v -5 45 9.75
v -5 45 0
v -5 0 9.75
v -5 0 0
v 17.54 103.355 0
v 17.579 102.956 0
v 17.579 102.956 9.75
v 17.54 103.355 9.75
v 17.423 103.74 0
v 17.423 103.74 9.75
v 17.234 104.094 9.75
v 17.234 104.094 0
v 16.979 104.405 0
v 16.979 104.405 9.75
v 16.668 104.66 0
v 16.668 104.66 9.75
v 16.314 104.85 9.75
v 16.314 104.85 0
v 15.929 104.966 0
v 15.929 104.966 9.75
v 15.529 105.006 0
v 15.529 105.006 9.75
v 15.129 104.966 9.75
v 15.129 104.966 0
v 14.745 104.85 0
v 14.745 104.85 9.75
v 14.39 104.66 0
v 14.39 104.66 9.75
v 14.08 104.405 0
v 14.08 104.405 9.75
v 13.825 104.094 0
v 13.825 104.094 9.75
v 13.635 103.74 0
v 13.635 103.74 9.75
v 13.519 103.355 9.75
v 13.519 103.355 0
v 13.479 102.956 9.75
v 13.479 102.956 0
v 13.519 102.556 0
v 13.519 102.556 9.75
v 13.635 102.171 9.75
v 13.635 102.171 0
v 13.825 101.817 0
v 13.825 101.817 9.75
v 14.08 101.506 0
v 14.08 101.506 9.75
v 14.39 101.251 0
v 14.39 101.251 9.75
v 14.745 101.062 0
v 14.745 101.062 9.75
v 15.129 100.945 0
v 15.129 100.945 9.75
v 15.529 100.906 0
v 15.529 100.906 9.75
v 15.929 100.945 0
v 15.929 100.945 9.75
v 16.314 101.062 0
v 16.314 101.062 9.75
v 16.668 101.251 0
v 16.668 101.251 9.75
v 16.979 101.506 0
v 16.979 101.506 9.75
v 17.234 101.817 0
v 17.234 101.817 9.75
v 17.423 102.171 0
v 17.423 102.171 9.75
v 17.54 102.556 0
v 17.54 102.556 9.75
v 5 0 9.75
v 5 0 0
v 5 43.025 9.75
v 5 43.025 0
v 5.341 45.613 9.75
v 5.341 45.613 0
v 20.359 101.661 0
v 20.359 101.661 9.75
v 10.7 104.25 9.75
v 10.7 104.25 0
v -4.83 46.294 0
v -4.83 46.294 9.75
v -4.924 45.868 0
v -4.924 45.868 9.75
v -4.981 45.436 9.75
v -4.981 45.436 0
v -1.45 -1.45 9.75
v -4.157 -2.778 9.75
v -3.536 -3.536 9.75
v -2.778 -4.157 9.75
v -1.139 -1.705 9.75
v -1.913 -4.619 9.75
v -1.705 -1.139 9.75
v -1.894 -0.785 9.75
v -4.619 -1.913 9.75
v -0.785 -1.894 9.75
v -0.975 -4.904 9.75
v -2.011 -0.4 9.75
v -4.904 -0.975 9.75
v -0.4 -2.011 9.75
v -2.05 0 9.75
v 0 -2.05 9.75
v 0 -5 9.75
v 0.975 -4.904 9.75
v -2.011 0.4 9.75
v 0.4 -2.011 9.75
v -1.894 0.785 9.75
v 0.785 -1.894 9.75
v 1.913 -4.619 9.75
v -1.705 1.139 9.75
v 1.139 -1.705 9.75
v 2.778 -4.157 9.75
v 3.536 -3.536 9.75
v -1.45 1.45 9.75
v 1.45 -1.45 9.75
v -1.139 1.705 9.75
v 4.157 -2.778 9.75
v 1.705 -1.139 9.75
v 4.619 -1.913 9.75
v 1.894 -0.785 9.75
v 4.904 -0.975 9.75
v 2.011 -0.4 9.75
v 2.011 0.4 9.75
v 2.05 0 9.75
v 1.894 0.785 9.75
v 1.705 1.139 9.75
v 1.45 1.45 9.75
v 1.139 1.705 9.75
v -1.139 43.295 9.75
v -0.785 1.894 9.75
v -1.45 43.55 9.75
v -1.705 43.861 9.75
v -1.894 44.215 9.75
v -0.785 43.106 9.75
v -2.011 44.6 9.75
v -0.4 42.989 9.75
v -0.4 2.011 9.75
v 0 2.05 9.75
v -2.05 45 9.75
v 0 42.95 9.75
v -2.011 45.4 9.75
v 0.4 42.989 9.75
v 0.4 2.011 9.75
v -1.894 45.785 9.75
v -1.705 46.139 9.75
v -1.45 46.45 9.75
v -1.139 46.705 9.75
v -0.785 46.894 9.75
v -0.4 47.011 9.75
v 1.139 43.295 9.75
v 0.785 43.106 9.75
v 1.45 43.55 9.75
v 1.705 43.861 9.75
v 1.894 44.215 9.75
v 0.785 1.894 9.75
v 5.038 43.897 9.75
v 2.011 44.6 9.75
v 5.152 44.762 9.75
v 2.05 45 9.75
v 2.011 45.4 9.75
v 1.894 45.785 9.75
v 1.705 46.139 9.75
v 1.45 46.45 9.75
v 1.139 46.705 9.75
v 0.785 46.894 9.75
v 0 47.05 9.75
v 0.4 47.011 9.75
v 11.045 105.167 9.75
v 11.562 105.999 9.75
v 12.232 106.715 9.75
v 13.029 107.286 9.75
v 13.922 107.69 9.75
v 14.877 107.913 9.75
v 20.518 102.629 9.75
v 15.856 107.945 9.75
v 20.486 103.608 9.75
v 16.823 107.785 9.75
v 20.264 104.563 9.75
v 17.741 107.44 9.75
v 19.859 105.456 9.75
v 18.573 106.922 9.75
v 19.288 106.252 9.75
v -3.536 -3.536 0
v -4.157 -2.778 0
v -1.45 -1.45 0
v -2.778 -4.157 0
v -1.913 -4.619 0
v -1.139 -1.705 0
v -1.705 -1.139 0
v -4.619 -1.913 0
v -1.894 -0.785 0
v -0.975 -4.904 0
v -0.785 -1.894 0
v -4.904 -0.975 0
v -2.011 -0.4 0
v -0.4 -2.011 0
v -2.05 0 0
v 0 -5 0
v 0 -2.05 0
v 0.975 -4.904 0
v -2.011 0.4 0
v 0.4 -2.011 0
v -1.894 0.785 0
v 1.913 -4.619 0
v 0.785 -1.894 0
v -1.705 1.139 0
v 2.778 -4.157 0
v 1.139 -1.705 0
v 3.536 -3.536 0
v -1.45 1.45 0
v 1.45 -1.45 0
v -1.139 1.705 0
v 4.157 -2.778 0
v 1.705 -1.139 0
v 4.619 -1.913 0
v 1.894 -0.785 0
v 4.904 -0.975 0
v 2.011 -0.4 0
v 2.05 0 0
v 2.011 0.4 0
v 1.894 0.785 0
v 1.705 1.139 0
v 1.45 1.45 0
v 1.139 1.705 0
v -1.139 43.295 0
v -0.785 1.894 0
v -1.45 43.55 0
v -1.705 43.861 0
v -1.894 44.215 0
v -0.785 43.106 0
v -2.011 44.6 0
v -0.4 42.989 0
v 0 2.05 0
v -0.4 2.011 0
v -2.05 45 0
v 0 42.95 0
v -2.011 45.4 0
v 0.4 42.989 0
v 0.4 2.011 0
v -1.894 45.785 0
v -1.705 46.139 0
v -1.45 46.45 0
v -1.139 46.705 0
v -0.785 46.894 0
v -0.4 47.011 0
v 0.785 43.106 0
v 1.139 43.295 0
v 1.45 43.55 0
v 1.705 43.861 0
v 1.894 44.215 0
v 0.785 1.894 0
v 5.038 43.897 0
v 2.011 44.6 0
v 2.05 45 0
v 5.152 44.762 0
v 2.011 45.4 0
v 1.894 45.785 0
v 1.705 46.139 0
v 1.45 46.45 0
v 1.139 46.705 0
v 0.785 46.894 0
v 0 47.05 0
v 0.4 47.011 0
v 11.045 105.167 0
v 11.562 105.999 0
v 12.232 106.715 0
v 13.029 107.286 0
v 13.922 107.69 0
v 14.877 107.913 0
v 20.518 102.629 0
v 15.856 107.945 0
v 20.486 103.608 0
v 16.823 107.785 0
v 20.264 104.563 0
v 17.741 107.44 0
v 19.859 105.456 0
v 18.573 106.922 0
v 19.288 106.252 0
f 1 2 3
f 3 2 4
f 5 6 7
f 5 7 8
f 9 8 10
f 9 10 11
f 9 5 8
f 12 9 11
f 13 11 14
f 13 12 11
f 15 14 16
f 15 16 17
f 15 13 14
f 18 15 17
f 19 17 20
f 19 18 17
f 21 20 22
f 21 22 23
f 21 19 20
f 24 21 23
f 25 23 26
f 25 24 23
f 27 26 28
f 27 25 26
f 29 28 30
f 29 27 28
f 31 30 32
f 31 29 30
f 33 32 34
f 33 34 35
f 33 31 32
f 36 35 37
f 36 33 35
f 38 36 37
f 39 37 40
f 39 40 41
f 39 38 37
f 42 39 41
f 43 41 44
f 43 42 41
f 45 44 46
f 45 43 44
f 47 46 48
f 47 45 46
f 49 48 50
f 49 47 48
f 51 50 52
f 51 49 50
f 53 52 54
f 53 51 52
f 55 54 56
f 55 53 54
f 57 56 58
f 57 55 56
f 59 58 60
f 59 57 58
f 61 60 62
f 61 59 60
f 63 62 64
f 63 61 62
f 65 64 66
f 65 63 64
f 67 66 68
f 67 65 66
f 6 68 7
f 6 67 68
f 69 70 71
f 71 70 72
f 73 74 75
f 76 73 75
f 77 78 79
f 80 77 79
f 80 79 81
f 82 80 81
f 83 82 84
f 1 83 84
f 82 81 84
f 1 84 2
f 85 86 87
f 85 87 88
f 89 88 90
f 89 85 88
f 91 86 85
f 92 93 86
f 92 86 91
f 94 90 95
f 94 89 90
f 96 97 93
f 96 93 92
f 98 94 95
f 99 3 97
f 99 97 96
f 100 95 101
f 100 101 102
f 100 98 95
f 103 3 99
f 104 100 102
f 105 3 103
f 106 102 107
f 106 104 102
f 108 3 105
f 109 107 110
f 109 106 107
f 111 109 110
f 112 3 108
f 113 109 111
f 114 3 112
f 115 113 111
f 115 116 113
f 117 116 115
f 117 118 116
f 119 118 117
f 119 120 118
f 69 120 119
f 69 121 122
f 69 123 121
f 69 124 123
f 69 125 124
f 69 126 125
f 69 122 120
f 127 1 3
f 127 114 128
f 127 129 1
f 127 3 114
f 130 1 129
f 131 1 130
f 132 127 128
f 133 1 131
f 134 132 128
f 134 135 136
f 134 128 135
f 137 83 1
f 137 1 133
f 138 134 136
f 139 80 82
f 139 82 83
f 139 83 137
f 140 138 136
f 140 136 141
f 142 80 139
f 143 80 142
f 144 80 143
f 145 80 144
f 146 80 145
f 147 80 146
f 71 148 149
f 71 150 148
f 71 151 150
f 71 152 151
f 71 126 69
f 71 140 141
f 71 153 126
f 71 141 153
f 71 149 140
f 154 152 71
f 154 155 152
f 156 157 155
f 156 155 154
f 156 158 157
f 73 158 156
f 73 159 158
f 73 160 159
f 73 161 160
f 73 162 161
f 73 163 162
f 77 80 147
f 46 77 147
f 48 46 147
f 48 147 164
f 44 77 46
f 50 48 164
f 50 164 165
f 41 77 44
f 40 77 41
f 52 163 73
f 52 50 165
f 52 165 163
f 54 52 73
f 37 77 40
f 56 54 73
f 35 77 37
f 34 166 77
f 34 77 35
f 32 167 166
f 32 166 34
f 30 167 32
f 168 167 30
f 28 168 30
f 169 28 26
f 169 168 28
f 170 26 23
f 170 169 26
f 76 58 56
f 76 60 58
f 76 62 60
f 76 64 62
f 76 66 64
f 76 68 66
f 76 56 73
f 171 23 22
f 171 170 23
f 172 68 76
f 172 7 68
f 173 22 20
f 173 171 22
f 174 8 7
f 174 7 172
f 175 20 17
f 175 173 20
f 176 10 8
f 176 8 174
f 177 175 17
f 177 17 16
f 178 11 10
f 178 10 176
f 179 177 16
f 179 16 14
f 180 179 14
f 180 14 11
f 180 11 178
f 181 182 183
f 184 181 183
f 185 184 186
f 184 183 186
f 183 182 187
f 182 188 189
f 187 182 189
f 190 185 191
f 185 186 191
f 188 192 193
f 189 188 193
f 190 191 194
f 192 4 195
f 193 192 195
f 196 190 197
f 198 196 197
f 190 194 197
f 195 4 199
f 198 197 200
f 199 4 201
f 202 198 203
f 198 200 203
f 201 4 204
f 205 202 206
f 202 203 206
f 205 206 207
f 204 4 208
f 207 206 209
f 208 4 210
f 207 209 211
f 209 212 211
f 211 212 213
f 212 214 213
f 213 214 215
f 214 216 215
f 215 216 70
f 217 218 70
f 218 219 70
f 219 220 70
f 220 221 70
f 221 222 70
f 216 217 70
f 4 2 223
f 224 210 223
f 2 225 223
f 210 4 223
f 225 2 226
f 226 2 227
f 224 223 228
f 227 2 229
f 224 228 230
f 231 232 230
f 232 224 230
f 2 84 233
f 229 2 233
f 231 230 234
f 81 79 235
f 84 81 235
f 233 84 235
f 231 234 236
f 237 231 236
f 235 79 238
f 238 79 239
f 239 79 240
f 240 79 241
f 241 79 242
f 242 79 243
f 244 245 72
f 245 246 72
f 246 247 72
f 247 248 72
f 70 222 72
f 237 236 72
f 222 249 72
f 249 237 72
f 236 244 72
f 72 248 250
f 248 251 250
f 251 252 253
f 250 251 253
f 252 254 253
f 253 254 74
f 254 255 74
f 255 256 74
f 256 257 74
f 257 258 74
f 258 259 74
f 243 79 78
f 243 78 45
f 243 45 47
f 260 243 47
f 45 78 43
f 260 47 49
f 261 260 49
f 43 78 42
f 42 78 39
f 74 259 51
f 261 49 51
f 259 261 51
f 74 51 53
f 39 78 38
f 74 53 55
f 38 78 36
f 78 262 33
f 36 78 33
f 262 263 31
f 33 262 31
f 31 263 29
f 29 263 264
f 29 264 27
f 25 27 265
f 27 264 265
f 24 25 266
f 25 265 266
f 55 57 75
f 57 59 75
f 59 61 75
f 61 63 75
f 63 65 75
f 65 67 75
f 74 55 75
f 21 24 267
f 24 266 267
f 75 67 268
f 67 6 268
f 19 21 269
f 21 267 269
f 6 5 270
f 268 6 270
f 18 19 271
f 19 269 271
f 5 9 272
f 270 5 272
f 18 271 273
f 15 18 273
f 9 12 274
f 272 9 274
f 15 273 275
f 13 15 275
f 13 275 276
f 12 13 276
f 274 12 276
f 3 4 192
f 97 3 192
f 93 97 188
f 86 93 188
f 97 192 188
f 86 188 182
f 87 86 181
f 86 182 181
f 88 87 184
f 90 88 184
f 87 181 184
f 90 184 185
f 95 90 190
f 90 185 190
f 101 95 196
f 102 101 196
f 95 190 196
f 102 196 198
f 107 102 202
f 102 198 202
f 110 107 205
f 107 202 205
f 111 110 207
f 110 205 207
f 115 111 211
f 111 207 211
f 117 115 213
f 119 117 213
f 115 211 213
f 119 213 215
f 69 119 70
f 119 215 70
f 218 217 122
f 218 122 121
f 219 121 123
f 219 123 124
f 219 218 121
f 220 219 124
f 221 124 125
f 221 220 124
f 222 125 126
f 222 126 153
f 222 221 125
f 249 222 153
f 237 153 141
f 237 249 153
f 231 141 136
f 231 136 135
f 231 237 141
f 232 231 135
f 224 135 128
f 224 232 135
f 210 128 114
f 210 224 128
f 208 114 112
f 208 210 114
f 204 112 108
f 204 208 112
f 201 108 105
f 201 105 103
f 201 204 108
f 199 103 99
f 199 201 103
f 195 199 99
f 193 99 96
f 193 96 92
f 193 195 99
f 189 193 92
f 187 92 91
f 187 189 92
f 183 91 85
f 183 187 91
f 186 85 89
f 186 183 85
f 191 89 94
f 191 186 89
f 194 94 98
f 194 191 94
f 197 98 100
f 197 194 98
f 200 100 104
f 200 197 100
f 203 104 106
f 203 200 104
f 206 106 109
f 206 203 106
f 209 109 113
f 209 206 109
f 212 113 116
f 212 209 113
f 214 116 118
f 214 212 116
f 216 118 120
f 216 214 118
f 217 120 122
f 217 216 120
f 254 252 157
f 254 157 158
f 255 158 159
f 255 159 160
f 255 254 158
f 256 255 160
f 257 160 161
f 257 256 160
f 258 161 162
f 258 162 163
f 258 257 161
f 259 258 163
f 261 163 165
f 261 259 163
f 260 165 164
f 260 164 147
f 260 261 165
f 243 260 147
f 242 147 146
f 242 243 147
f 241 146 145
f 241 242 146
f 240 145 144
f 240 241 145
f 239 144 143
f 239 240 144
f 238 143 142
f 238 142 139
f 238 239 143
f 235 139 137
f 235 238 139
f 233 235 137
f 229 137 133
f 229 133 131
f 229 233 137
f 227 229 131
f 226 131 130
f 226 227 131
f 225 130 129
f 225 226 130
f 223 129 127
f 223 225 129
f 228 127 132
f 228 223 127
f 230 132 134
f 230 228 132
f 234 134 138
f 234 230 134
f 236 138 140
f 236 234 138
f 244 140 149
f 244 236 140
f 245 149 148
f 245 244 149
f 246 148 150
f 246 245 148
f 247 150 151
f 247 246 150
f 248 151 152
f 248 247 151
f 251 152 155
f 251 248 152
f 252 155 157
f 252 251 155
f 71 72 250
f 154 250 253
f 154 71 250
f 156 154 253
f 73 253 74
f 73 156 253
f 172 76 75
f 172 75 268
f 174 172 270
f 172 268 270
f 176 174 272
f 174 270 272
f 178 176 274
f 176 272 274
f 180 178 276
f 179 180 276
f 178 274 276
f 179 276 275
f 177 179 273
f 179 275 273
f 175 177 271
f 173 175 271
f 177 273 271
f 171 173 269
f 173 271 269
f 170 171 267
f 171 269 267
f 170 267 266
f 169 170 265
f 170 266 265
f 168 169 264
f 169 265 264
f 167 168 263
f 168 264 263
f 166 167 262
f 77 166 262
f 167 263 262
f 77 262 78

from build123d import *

# Parameters (mm, degrees)
ESQUISSE1_R        = 2.05
BOSS_EXTRU_1_DEPTH = 9.75
CONG_1_R           = 10


with BuildPart() as part:
    # Esquisse1 → Boss.-Extru.1 (new body)
    # profile 1 of 3: a face of its own
    with BuildSketch(Plane.XY):
        with BuildLine():
            Line((10.699513575, 104.249644803), (-4.829629131, 46.294095226))
            ThreePointArc((-4.829629131, 46.294095226), (0.652630961, 49.957224307), (5, 45))
            Line((5, 45), (5, 44.341737512))
            Line((5, 44.341737512), (20.358771838, 101.661454352))
            ThreePointArc((20.358771838, 101.661454352), (16.823237932, 107.785178709), (10.699513575, 104.249644803))
        make_face()
        with Locations((15.529142706, 102.955549577)):
            Circle(ESQUISSE1_R, mode=Mode.SUBTRACT)
    # profile 2 of 3: a face of its own
    with BuildSketch(Plane.XY):
        with BuildLine():
            ThreePointArc((-4.829629131, 46.294095226), (-4.957224307, 45.652630961), (-5, 45))
            ThreePointArc((-5, 45), (-0.652630961, 40.042775693), (4.829629131, 43.705904774))
            Line((4.829629131, 43.705904774), (5, 44.341737512))
            Line((5, 44.341737512), (5, 45))
            ThreePointArc((5, 45), (0.652630961, 49.957224307), (-4.829629131, 46.294095226))
        make_face()
        with Locations((0, 45)):
            Circle(ESQUISSE1_R, mode=Mode.SUBTRACT)
    # profile 3 of 3: a face of its own
    with BuildSketch(Plane.XY):
        with BuildLine():
            Line((-5, 45), (-5, 0))
            ThreePointArc((-5, 0), (0, -5), (5, 0))
            Line((5, 0), (5, 44.341737512))
            Line((5, 44.341737512), (4.829629131, 43.705904774))
            ThreePointArc((4.829629131, 43.705904774), (-0.652630961, 40.042775693), (-5, 45))
        make_face()
        Circle(ESQUISSE1_R, mode=Mode.SUBTRACT)
    extrude(amount=BOSS_EXTRU_1_DEPTH)

    # Congé1
    cong_1_edges = [part.edges().sort_by_distance(p)[0] for p in [
        (5, 44.341737512, 4.875),
    ]]
    fillet(cong_1_edges, radius=CONG_1_R)


solid = part.part
